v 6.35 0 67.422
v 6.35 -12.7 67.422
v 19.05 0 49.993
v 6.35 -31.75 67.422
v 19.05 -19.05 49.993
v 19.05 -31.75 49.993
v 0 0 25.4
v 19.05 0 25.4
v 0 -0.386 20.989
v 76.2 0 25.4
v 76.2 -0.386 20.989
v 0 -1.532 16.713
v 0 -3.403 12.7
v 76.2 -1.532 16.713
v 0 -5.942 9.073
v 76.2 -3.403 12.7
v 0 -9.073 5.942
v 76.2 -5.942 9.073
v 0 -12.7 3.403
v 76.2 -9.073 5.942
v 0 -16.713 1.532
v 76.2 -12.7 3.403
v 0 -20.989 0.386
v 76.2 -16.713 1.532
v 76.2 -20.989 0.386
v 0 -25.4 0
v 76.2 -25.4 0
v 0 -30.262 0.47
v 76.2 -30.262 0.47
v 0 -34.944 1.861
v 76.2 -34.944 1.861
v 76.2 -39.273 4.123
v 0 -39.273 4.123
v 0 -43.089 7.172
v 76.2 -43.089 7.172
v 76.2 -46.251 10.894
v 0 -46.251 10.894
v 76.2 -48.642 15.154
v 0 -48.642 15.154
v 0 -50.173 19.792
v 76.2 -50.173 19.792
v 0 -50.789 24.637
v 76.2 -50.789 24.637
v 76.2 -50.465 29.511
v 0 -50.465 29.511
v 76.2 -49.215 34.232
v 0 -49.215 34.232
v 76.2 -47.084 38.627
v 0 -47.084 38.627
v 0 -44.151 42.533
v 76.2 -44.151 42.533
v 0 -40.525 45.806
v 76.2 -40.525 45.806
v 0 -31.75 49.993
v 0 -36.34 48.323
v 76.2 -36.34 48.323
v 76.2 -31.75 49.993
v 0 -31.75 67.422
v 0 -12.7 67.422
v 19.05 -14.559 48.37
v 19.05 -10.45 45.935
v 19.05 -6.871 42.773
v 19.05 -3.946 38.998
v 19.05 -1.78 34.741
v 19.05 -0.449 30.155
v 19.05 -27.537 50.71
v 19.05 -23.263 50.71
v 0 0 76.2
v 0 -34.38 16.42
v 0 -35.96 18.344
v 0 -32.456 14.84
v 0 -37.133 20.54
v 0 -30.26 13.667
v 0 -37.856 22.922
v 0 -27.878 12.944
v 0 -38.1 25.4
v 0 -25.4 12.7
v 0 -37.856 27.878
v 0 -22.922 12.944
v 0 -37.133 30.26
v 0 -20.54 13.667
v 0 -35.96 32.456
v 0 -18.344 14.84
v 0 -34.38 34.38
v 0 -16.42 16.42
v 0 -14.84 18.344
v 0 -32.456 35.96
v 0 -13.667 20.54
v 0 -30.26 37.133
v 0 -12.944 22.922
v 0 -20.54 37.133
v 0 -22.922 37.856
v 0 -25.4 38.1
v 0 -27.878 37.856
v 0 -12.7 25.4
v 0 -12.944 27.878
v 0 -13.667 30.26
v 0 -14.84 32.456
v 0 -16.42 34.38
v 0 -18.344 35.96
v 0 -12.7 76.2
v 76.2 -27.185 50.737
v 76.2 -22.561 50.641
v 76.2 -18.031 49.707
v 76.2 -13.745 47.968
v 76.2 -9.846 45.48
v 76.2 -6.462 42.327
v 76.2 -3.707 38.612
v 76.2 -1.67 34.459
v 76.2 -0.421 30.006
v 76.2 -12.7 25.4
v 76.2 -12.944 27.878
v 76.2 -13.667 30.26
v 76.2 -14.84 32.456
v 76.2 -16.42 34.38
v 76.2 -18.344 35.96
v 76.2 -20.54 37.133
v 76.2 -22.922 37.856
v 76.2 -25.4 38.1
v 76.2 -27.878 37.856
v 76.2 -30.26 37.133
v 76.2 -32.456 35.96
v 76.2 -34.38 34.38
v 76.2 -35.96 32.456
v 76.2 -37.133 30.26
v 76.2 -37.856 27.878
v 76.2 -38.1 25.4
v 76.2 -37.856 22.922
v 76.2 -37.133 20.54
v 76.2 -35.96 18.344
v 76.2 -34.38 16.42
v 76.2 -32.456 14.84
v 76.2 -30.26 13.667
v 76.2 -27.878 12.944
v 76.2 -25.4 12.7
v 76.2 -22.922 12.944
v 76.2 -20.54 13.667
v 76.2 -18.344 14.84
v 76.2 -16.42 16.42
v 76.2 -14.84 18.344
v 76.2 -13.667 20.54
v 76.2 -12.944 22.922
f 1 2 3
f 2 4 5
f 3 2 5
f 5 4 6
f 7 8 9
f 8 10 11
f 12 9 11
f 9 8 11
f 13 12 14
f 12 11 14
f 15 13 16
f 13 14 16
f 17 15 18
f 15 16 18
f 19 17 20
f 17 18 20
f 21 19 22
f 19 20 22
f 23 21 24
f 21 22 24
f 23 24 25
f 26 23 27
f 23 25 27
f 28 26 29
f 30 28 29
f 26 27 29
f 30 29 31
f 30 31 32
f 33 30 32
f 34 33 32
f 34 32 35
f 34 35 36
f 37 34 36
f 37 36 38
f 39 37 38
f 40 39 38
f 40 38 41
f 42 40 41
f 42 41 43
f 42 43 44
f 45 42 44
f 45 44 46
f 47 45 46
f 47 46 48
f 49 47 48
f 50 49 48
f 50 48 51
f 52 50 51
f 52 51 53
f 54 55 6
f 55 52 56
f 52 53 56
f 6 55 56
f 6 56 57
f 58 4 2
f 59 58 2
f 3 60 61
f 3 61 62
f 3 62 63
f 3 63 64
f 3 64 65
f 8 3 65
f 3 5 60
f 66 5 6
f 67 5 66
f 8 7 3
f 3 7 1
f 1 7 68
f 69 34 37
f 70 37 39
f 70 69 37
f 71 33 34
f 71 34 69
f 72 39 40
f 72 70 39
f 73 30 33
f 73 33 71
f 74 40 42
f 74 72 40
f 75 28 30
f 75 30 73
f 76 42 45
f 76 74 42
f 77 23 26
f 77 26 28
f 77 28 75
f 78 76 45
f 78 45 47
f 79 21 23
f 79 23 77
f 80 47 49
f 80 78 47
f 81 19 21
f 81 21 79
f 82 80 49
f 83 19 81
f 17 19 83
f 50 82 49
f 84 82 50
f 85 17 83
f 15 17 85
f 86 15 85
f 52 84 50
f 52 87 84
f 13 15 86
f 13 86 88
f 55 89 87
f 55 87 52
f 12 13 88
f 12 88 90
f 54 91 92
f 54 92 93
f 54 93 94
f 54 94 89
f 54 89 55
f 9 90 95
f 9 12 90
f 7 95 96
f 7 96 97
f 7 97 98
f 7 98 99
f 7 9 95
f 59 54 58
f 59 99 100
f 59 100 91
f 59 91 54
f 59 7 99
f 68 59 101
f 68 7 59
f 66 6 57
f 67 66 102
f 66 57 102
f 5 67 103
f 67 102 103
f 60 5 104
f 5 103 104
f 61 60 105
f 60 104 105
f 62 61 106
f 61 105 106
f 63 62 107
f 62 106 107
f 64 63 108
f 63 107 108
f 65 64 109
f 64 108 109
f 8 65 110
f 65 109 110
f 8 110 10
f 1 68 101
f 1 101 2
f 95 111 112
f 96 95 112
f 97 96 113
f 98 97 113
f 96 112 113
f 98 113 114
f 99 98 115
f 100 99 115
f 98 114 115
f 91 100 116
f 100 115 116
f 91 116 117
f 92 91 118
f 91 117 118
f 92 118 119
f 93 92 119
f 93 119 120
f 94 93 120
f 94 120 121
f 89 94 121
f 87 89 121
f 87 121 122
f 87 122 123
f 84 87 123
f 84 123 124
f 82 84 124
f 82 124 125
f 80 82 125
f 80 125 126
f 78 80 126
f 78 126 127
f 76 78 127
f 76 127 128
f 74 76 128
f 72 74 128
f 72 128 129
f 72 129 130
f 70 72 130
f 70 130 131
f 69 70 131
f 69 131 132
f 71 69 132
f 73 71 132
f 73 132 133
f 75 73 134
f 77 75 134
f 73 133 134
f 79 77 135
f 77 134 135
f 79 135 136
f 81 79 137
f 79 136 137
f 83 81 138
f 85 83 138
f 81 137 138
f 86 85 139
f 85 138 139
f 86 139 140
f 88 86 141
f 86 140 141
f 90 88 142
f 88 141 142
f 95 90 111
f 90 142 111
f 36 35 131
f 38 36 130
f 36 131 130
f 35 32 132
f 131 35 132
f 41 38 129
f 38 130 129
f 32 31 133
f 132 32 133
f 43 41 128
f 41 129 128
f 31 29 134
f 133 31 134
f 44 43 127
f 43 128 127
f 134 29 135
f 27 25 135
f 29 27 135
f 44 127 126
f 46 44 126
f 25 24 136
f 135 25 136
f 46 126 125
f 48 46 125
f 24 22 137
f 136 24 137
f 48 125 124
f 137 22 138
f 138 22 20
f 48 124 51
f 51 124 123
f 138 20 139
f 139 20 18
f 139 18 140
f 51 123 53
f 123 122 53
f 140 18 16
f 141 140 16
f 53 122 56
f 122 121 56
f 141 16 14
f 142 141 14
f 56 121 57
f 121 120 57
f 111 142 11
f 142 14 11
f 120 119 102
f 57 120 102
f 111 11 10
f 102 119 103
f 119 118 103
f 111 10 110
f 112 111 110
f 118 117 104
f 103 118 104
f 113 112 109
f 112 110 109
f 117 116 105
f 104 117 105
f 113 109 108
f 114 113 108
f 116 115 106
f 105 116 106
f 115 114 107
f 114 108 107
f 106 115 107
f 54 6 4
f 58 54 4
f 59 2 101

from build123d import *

# Parameters (mm, degrees)
F0_W     = 76.2
F0_H     = 76.2
F1_DEPTH = 50.8
F2_R     = 12.7
F3_DEPTH = 76.201
F4_DEPTH = 57.15
F6_DEPTH = 31.751
F8_DEPTH = 12.701


with BuildPart() as f1:
    # F0 (on Front) → F1 (new body)
    with BuildSketch(Plane.XZ):
        with Locations((38.1, 38.1)):
            Rectangle(F0_W, F0_H)
    extrude(amount=F1_DEPTH)

    # F2 (on face) → F3 (cut, through all)
    with BuildSketch(Plane.YZ.offset(76.2)):
        with BuildLine():
            Line((-12.7, 67.4217641354), (-12.7, 76.2))
            Line((-12.7, 76.2), (-50.8, 76.2))
            Line((-50.8, 76.2), (-50.8, 25.4))
            ThreePointArc((-50.8, 25.4), (-45.4804631421, 40.9542598667), (-31.75, 49.9934442484))
            Line((-31.75, 49.9934442484), (-31.75, 67.4217641354))
            Line((-31.75, 67.4217641354), (-12.7, 67.4217641354))
        make_face()
        with BuildLine():
            Line((-50.8, 0), (-25.4, 0))
            ThreePointArc((-25.4, 0), (-43.3605122421, 7.4394877579), (-50.8, 25.4))
            Line((-50.8, 25.4), (-50.8, 0))
        make_face()
        with BuildLine():
            Line((0, 0), (0, 25.4))
            ThreePointArc((0, 25.4), (-7.4394877579, 7.4394877579), (-25.4, 0))
            Line((-25.4, 0), (0, 0))
        make_face()
        with Locations((-25.4, 25.4)):
            Circle(F2_R)
    extrude(amount=-F3_DEPTH, mode=Mode.SUBTRACT)

    # F2 (on face) → F4 (cut)
    with BuildSketch(Plane.YZ.offset(76.2)):
        with BuildLine():
            Line((0, 25.4), (0, 76.2))
            Line((0, 76.2), (-12.7, 76.2))
            Line((-12.7, 76.2), (-12.7, 67.4217641354))
            Line((-12.7, 67.4217641354), (-31.75, 67.4217641354))
            Line((-31.75, 67.4217641354), (-31.75, 49.9934442484))
            ThreePointArc((-31.75, 49.9934442484), (-9.8457401333, 45.4804631421), (0, 25.4))
        make_face()
    extrude(amount=-F4_DEPTH, mode=Mode.SUBTRACT)

    # F5 (on face) → F6 (cut, through all)
    with BuildSketch(Plane.XZ.offset(31.75)):
        Polygon((6.35, 67.4217641354), (19.05, 49.9934442484), (19.05, 67.4217641354), align=None)
    extrude(amount=-F6_DEPTH, mode=Mode.SUBTRACT)

    # F7 (on face) → F8 (cut, through all)
    with BuildSketch(Plane.XZ.offset(12.7)):
        Polygon((0, 76.2), (6.35, 67.4217641354), (19.05, 67.4217641354), (19.05, 76.2), align=None)
    extrude(amount=-F8_DEPTH, mode=Mode.SUBTRACT)


solid = f1.part
